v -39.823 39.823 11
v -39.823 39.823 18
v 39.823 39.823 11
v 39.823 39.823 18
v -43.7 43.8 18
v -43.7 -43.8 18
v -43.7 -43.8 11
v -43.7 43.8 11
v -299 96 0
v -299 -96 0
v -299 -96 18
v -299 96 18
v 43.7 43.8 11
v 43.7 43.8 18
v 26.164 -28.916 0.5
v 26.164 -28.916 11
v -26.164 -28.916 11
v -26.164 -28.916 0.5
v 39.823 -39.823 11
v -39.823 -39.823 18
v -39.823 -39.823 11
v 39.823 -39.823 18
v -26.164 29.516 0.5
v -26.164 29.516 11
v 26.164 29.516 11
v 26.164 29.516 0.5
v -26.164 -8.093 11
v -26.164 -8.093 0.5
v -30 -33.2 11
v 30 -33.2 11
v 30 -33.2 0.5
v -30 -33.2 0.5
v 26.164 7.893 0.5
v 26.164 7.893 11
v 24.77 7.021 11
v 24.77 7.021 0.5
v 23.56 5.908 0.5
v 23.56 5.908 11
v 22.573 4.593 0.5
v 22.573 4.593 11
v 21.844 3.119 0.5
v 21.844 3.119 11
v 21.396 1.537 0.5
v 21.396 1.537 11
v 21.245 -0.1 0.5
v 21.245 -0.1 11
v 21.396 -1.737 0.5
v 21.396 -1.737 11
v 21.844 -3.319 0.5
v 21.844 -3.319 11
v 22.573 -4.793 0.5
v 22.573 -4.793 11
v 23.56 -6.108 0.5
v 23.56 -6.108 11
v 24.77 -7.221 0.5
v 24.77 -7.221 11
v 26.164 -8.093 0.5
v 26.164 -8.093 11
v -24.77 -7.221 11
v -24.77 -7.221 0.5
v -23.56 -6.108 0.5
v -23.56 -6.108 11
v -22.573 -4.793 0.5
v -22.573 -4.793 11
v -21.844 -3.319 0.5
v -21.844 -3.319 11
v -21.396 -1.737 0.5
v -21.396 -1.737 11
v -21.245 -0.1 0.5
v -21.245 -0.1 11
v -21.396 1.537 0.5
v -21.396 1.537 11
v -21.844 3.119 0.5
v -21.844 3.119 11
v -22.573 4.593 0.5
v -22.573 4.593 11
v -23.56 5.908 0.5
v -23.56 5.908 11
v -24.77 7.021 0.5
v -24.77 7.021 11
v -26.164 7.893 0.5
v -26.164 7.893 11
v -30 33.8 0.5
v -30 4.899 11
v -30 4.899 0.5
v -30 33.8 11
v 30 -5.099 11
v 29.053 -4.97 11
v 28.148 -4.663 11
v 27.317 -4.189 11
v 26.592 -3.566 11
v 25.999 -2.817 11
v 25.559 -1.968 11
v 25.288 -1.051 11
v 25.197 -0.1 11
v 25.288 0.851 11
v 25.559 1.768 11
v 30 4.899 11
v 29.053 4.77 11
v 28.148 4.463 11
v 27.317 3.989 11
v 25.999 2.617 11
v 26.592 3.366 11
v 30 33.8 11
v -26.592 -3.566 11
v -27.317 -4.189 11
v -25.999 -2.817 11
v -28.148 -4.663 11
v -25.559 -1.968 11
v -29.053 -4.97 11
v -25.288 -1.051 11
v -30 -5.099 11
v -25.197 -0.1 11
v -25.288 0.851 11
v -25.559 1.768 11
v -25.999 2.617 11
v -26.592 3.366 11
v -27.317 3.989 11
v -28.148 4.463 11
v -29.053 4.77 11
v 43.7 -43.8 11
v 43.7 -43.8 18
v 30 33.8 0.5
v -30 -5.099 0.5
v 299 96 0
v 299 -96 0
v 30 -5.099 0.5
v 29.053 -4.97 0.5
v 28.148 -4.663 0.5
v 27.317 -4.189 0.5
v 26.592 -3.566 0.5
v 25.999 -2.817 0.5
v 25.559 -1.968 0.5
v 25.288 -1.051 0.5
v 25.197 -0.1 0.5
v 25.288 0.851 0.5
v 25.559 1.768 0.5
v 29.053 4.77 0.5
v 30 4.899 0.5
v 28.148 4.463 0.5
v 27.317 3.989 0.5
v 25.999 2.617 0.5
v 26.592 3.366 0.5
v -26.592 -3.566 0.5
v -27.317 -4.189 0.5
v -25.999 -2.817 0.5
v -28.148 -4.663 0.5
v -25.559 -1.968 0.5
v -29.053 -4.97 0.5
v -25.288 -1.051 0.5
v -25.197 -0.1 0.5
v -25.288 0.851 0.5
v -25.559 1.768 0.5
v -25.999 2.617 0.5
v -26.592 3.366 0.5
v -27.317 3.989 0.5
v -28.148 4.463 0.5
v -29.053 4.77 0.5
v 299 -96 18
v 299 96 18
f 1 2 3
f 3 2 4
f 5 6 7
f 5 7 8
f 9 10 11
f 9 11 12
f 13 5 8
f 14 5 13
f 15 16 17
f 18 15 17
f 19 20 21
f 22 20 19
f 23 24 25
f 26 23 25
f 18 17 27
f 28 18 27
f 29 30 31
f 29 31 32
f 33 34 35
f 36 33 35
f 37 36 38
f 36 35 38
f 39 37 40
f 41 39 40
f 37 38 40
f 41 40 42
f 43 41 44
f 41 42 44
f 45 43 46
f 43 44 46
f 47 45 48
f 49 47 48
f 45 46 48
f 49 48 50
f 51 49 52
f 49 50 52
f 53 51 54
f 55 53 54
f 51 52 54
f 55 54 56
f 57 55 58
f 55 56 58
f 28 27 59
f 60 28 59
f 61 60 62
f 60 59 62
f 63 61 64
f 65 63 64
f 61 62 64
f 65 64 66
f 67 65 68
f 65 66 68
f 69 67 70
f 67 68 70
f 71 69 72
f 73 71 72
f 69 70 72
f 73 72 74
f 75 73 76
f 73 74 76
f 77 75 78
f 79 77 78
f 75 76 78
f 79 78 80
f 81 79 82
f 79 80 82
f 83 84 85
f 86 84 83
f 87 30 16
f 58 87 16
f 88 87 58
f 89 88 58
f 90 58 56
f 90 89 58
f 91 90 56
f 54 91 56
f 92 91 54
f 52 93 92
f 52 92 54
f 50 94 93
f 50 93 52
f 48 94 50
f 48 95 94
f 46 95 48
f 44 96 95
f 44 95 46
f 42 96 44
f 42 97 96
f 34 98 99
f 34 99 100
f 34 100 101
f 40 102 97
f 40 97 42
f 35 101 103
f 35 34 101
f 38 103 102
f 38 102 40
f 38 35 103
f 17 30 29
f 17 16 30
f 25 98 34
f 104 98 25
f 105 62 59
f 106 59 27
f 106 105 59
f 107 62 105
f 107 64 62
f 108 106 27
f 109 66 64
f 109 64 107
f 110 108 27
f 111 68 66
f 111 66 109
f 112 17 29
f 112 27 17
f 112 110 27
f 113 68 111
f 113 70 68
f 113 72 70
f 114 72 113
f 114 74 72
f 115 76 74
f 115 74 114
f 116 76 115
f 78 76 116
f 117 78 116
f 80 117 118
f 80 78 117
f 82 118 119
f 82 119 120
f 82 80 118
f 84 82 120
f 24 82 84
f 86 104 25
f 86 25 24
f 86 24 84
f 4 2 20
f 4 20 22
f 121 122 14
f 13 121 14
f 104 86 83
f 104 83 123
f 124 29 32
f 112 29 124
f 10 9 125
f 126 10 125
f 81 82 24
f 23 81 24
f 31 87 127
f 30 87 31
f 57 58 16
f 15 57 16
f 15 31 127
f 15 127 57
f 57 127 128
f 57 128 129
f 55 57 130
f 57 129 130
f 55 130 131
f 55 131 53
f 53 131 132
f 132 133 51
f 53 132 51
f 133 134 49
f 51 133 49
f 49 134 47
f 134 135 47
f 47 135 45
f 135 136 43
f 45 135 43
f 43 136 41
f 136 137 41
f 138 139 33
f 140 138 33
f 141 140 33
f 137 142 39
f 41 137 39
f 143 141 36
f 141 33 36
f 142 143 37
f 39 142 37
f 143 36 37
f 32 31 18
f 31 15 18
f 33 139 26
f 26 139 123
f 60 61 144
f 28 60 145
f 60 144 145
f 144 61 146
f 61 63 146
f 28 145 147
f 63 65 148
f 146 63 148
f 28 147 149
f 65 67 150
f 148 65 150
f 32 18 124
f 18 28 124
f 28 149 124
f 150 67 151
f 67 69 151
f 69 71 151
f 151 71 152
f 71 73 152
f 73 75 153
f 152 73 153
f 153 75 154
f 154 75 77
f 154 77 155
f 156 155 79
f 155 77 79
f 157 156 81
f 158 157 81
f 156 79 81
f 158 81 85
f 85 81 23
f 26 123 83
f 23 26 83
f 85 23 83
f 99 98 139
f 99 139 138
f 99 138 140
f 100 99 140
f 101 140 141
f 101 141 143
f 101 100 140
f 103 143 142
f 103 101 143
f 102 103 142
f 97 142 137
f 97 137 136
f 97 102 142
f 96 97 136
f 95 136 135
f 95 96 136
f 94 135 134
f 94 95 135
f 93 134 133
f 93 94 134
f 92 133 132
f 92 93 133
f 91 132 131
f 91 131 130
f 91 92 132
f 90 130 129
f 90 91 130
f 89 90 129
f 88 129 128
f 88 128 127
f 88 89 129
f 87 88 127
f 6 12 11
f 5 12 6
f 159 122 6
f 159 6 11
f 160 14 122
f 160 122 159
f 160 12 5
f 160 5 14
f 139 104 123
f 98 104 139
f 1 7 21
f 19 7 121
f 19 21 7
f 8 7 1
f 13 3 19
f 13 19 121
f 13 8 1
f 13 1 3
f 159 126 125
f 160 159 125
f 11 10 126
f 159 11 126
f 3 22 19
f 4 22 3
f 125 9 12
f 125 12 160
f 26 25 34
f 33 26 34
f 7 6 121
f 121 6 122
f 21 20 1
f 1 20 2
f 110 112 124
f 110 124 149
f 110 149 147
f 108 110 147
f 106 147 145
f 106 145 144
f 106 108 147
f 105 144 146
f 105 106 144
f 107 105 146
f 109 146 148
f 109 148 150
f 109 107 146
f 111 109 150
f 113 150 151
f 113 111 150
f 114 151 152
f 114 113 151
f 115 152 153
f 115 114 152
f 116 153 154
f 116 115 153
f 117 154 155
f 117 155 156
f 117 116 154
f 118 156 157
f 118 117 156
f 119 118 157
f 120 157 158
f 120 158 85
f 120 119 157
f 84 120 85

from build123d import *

# Parameters (mm, degrees)
SKETCH1_W           = 598
SKETCH1_H           = 192
BOSS_EXTRUDE1_DEPTH = 18
SKETCH2_W           = 87.4
SKETCH2_H           = 87.6
SKETCH2_W_2         = 79.646425984
SKETCH2_H_2         = 79.646425984
CUT_EXTRUDE1_DEPTH  = 7
CUT_EXTRUDE2_DEPTH  = 10.5


with BuildPart() as part:
    # Sketch1 → Boss-Extrude1 (new body)
    with BuildSketch(Plane.XY):
        Rectangle(SKETCH1_W, SKETCH1_H)
    extrude(amount=BOSS_EXTRUDE1_DEPTH)

    # Sketch2 → Cut-Extrude1 (cut)
    with BuildSketch(Plane.XY.offset(18)):
        Rectangle(SKETCH2_W, SKETCH2_H)
        Rectangle(SKETCH2_W_2, SKETCH2_H_2, mode=Mode.SUBTRACT)
    extrude(amount=-CUT_EXTRUDE1_DEPTH, mode=Mode.SUBTRACT)

    # Sketch3 → Cut-Extrude2 (cut)
    with BuildSketch(Plane.XY.offset(11)):
        with BuildLine():
            Line((30, -33.2), (-30, -33.2))
            Line((-30, -33.2), (-30, -5.0989999))
            ThreePointArc((-30, -5.0989999), (-25.197000899, -0.1), (-30, 4.8989999))
            Line((-30, 4.8989999), (-30, 33.8))
            Line((-30, 33.8), (30, 33.8))
            Line((30, 33.8), (30, 4.8989999))
            ThreePointArc((30, 4.8989999), (25.197000899, -0.1), (30, -5.0989999))
            Line((30, -5.0989999), (30, -33.2))
        make_face()
        with BuildLine():
            Line((26.16375103, -28.91618865), (-26.16375103, -28.91618865))
            Line((-26.16375103, -28.91618865), (-26.16375103, -8.093369002))
            ThreePointArc((-26.16375103, -8.093369002), (-21.245378078, -0.1), (-26.16375103, 7.893369002))
            Line((-26.16375103, 7.893369002), (-26.16375103, 29.51618865))
            Line((-26.16375103, 29.51618865), (26.16375103, 29.51618865))
            Line((26.16375103, 29.51618865), (26.16375103, 7.893369002))
            ThreePointArc((26.16375103, 7.893369002), (21.245378078, -0.1), (26.16375103, -8.093369002))
            Line((26.16375103, -8.093369002), (26.16375103, -28.91618865))
        make_face(mode=Mode.SUBTRACT)
    extrude(amount=-CUT_EXTRUDE2_DEPTH, mode=Mode.SUBTRACT)


solid = part.part
